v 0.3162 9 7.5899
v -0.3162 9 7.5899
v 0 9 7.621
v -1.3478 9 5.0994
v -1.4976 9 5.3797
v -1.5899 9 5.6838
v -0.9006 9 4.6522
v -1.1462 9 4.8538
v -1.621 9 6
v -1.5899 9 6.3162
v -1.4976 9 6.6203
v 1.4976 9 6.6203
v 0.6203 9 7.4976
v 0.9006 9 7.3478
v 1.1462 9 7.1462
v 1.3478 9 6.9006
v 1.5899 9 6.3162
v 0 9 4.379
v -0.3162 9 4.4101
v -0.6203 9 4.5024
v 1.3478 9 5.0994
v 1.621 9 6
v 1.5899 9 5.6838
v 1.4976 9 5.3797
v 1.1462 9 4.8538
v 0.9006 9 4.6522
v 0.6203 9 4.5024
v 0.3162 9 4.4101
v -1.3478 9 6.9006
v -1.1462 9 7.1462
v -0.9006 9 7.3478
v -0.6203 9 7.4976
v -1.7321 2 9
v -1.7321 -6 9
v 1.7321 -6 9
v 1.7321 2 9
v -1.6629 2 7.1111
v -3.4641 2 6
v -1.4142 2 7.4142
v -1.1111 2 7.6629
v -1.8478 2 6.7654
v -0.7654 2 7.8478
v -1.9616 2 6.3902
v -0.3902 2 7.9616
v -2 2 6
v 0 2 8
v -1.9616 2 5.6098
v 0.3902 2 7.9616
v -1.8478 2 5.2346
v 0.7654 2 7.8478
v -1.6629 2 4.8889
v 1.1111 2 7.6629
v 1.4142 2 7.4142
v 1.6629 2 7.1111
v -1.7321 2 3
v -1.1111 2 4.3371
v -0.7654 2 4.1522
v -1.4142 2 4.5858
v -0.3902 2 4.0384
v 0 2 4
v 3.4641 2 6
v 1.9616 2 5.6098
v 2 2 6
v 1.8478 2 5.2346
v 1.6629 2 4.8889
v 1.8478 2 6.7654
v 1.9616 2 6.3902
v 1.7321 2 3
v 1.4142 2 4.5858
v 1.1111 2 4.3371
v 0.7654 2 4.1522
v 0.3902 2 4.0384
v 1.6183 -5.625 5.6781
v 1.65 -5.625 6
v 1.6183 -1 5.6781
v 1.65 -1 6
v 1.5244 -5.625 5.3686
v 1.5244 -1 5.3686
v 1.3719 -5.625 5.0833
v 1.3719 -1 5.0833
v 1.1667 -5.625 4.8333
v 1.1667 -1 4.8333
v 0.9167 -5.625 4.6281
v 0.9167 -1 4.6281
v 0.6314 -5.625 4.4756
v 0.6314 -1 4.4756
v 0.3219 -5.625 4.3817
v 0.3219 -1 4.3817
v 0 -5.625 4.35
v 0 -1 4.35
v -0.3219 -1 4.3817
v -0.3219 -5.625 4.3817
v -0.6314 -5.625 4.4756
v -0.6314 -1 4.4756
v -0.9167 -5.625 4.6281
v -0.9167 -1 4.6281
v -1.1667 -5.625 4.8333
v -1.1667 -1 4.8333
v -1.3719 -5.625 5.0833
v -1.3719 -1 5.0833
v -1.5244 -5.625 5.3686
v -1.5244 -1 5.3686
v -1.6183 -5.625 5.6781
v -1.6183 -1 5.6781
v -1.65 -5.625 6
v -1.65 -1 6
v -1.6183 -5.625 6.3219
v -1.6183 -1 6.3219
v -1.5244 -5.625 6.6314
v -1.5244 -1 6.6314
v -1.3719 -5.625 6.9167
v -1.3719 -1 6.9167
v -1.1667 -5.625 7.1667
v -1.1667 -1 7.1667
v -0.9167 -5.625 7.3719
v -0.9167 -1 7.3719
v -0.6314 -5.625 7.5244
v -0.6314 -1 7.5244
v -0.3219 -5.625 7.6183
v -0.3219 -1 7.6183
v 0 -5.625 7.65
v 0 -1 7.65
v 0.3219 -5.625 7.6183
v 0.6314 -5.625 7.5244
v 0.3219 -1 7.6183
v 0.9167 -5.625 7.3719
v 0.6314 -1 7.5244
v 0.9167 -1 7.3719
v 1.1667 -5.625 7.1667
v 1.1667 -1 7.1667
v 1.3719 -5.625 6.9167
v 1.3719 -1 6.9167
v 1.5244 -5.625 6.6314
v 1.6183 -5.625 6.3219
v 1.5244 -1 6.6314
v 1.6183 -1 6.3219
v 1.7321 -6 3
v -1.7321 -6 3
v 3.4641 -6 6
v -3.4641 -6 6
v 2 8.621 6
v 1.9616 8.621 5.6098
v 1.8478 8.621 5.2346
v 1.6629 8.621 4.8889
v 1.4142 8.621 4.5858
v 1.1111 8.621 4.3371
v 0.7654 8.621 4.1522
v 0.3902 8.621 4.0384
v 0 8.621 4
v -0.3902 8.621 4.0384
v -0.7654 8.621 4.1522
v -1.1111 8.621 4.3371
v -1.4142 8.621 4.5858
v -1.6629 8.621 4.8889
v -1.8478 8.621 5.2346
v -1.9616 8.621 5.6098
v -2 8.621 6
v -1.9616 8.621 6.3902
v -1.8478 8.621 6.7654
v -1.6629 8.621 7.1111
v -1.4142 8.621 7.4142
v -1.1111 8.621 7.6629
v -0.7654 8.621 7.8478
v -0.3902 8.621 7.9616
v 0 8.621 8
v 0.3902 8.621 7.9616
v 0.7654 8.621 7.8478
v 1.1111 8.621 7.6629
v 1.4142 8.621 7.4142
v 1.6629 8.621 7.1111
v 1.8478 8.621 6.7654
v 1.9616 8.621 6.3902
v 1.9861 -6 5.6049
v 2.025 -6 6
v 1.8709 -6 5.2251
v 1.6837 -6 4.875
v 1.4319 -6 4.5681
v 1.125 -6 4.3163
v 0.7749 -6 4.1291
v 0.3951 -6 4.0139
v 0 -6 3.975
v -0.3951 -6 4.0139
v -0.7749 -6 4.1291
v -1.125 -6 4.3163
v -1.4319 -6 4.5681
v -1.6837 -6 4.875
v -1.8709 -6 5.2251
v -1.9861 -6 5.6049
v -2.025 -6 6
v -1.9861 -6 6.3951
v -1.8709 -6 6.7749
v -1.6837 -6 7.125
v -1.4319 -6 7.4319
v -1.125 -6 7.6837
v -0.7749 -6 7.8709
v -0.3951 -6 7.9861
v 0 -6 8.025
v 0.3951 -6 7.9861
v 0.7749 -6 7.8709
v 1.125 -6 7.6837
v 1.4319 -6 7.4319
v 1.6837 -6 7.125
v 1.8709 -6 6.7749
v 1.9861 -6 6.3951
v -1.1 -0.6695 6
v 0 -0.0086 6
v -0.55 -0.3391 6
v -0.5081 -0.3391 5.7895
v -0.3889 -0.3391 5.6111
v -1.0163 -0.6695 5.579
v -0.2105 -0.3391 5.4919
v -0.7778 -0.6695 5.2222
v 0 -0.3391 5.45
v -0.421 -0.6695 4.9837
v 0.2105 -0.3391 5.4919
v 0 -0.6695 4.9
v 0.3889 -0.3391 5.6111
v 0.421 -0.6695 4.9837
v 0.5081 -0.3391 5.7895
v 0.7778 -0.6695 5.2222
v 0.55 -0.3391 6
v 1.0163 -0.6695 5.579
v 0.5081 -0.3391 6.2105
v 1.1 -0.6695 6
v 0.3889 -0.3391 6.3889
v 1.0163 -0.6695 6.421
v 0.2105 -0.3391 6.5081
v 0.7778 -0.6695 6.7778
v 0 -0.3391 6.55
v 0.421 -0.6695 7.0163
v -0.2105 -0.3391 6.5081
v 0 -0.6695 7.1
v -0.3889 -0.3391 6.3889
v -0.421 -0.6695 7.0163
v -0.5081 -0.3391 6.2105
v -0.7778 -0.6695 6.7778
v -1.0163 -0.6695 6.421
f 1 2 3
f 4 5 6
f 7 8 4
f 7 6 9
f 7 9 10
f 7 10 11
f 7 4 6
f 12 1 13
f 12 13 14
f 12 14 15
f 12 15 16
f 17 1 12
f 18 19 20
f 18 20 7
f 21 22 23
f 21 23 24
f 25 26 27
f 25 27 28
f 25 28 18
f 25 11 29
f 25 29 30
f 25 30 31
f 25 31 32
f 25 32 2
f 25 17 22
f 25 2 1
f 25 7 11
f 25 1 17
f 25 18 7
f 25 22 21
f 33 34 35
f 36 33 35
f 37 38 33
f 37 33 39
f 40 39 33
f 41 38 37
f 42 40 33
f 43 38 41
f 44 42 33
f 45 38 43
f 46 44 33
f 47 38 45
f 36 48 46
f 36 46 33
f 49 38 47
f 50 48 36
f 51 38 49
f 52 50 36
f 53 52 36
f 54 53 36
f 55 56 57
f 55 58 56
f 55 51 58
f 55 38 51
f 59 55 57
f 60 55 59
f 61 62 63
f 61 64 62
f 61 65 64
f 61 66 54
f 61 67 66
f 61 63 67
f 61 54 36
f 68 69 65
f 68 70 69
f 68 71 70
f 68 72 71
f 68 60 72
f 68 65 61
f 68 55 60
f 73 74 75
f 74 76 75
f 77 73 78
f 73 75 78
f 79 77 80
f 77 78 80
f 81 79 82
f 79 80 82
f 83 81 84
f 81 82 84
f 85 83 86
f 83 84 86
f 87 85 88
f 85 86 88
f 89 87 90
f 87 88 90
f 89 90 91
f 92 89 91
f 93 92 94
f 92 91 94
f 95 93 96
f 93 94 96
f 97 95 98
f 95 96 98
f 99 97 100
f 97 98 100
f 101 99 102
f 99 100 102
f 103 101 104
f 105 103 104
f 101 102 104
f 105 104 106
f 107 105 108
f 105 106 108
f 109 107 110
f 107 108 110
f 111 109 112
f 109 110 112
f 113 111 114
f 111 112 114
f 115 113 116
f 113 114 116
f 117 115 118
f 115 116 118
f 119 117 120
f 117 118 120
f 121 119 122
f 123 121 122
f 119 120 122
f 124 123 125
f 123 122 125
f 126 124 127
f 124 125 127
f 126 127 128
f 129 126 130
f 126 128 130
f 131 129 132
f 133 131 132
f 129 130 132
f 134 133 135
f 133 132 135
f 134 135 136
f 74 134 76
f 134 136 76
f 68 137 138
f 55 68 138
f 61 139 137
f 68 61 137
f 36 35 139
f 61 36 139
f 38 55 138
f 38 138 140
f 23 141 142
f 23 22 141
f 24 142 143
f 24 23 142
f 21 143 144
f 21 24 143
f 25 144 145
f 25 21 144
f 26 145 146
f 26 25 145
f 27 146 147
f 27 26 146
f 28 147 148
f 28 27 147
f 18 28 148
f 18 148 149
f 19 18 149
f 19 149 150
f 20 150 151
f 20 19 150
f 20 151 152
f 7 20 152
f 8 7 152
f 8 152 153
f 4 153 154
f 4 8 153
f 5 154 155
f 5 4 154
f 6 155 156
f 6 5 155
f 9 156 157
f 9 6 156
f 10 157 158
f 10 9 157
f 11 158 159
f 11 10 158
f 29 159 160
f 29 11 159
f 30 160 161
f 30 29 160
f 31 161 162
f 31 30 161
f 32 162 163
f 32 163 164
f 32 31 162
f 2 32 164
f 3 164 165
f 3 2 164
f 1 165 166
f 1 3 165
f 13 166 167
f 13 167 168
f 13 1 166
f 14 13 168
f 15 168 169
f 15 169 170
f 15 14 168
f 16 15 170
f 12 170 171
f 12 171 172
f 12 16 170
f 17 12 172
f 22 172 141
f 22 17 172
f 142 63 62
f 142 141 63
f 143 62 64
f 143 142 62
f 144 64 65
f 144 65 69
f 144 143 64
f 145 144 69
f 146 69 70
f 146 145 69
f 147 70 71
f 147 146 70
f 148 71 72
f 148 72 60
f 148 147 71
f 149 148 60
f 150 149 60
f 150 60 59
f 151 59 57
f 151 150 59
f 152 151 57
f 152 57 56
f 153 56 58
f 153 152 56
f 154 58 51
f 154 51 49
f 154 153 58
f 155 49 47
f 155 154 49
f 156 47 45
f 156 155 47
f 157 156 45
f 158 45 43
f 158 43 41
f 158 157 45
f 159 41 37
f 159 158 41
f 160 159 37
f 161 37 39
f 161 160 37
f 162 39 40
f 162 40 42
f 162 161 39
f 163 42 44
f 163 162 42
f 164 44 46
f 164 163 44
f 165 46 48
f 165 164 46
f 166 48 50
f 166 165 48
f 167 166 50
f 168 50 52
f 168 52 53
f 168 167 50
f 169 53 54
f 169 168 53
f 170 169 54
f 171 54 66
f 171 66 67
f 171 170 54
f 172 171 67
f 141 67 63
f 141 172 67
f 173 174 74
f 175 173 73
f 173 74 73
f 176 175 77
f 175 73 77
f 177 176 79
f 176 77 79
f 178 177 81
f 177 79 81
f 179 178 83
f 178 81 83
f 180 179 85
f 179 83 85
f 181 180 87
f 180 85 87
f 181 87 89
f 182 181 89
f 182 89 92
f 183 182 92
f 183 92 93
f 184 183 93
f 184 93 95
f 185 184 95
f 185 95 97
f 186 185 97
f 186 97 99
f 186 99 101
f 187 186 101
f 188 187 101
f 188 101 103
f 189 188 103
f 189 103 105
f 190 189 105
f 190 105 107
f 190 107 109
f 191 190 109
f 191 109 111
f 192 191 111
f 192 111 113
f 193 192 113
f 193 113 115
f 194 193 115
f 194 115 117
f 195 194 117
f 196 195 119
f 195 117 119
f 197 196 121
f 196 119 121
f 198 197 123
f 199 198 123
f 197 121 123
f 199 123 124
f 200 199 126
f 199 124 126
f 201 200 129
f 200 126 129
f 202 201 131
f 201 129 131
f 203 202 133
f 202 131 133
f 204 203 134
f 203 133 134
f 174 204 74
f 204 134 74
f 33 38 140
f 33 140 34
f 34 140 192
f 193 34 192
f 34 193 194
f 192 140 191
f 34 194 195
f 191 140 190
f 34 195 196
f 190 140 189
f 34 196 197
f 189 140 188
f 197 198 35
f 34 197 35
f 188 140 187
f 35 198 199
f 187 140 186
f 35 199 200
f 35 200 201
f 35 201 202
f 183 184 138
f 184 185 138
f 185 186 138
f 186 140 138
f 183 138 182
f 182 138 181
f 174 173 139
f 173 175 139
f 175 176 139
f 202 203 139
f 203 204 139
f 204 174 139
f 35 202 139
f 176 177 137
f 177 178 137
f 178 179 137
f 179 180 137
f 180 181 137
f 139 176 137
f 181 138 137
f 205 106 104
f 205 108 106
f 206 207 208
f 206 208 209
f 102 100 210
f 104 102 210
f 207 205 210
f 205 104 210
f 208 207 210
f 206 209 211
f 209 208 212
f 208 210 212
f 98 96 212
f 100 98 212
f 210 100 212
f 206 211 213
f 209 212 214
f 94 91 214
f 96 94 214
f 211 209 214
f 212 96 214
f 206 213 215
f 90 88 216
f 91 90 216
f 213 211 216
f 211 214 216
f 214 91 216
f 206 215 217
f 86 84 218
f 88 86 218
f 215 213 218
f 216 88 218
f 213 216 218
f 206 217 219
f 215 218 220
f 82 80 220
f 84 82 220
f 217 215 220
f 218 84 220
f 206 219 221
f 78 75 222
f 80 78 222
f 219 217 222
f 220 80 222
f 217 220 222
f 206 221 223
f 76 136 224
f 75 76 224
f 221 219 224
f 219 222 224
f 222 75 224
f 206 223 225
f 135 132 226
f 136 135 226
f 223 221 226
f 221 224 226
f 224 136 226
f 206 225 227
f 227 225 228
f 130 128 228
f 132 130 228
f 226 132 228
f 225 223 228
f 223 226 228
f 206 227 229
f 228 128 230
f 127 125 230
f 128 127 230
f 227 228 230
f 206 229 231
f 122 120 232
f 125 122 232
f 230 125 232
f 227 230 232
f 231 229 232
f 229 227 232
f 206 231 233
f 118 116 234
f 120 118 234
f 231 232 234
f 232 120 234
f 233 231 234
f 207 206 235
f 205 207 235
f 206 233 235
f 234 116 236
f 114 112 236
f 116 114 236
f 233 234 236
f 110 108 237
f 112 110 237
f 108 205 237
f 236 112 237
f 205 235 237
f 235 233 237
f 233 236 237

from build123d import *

# Parameters (mm, degrees)
EXTRUDE_1_DEPTH              = 8
HOLE_WIZARD_M4_1_D           = 3.3
HOLE_WIZARD_M4_1_DEPTH       = 5
HOLE_WIZARD_M4_1_CSINK_D     = 4.05
HOLE_WIZARD_M4_1_CSINK_ANGLE = 90
HOLE_WIZARD_M4_1_TIP         = 0.991420021
MOVE_BODY_1_ANGLE            = 90


# Read off the part's stored shape, not the designer's step: M4 机械螺纹 螺柱1
with BuildPart() as part:
    # 草图1 → 凸台-拉伸1 (new body)
    with BuildSketch(Plane.XY):
        Polygon((3.464101615, 0), (1.732050808, 3), (-1.732050808, 3), (-3.464101615, 0), (-1.732050808, -3), (1.732050808, -3), align=None)
    extrude(amount=EXTRUDE_1_DEPTH)

    # M4 螺纹孔1
    with Locations(Plane(origin=(0, 0, 0), x_dir=(-1, 0, 0), z_dir=(0, 0, -1))):
        with Locations((0, 0)):
            CounterSinkHole(HOLE_WIZARD_M4_1_D / 2, HOLE_WIZARD_M4_1_CSINK_D / 2, depth=HOLE_WIZARD_M4_1_DEPTH, counter_sink_angle=HOLE_WIZARD_M4_1_CSINK_ANGLE)
            with Locations((0, 0, -(HOLE_WIZARD_M4_1_DEPTH + HOLE_WIZARD_M4_1_TIP / 2))):  # 118° drill point
                Cone(0, HOLE_WIZARD_M4_1_D / 2, HOLE_WIZARD_M4_1_TIP, mode=Mode.SUBTRACT)

    # M4 机械螺纹 螺柱1 outline → M4 机械螺纹 螺柱1 (revolve)
    with BuildSketch(Plane.XZ):
        Polygon((1.621, 15), (0, 15), (0, 8), (2, 8), (2, 14.621), align=None)
    revolve(axis=Axis((0, 0, 0), (0, 0, 1)))


with BuildPart() as part_1:
    # Move Body 1: moved
    add(part.part.rotate(Axis((0, 0, 6), (-1, 0, 0)), MOVE_BODY_1_ANGLE))


solid = part_1.part
